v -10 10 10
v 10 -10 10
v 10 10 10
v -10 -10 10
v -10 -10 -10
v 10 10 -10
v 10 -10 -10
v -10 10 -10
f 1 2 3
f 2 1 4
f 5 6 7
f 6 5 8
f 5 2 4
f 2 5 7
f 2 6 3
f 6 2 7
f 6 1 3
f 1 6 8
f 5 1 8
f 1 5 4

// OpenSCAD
// Parametric cube — FDM test primitive
$fn = 32;
size = 20;

cube([size, size, size], center = true);
